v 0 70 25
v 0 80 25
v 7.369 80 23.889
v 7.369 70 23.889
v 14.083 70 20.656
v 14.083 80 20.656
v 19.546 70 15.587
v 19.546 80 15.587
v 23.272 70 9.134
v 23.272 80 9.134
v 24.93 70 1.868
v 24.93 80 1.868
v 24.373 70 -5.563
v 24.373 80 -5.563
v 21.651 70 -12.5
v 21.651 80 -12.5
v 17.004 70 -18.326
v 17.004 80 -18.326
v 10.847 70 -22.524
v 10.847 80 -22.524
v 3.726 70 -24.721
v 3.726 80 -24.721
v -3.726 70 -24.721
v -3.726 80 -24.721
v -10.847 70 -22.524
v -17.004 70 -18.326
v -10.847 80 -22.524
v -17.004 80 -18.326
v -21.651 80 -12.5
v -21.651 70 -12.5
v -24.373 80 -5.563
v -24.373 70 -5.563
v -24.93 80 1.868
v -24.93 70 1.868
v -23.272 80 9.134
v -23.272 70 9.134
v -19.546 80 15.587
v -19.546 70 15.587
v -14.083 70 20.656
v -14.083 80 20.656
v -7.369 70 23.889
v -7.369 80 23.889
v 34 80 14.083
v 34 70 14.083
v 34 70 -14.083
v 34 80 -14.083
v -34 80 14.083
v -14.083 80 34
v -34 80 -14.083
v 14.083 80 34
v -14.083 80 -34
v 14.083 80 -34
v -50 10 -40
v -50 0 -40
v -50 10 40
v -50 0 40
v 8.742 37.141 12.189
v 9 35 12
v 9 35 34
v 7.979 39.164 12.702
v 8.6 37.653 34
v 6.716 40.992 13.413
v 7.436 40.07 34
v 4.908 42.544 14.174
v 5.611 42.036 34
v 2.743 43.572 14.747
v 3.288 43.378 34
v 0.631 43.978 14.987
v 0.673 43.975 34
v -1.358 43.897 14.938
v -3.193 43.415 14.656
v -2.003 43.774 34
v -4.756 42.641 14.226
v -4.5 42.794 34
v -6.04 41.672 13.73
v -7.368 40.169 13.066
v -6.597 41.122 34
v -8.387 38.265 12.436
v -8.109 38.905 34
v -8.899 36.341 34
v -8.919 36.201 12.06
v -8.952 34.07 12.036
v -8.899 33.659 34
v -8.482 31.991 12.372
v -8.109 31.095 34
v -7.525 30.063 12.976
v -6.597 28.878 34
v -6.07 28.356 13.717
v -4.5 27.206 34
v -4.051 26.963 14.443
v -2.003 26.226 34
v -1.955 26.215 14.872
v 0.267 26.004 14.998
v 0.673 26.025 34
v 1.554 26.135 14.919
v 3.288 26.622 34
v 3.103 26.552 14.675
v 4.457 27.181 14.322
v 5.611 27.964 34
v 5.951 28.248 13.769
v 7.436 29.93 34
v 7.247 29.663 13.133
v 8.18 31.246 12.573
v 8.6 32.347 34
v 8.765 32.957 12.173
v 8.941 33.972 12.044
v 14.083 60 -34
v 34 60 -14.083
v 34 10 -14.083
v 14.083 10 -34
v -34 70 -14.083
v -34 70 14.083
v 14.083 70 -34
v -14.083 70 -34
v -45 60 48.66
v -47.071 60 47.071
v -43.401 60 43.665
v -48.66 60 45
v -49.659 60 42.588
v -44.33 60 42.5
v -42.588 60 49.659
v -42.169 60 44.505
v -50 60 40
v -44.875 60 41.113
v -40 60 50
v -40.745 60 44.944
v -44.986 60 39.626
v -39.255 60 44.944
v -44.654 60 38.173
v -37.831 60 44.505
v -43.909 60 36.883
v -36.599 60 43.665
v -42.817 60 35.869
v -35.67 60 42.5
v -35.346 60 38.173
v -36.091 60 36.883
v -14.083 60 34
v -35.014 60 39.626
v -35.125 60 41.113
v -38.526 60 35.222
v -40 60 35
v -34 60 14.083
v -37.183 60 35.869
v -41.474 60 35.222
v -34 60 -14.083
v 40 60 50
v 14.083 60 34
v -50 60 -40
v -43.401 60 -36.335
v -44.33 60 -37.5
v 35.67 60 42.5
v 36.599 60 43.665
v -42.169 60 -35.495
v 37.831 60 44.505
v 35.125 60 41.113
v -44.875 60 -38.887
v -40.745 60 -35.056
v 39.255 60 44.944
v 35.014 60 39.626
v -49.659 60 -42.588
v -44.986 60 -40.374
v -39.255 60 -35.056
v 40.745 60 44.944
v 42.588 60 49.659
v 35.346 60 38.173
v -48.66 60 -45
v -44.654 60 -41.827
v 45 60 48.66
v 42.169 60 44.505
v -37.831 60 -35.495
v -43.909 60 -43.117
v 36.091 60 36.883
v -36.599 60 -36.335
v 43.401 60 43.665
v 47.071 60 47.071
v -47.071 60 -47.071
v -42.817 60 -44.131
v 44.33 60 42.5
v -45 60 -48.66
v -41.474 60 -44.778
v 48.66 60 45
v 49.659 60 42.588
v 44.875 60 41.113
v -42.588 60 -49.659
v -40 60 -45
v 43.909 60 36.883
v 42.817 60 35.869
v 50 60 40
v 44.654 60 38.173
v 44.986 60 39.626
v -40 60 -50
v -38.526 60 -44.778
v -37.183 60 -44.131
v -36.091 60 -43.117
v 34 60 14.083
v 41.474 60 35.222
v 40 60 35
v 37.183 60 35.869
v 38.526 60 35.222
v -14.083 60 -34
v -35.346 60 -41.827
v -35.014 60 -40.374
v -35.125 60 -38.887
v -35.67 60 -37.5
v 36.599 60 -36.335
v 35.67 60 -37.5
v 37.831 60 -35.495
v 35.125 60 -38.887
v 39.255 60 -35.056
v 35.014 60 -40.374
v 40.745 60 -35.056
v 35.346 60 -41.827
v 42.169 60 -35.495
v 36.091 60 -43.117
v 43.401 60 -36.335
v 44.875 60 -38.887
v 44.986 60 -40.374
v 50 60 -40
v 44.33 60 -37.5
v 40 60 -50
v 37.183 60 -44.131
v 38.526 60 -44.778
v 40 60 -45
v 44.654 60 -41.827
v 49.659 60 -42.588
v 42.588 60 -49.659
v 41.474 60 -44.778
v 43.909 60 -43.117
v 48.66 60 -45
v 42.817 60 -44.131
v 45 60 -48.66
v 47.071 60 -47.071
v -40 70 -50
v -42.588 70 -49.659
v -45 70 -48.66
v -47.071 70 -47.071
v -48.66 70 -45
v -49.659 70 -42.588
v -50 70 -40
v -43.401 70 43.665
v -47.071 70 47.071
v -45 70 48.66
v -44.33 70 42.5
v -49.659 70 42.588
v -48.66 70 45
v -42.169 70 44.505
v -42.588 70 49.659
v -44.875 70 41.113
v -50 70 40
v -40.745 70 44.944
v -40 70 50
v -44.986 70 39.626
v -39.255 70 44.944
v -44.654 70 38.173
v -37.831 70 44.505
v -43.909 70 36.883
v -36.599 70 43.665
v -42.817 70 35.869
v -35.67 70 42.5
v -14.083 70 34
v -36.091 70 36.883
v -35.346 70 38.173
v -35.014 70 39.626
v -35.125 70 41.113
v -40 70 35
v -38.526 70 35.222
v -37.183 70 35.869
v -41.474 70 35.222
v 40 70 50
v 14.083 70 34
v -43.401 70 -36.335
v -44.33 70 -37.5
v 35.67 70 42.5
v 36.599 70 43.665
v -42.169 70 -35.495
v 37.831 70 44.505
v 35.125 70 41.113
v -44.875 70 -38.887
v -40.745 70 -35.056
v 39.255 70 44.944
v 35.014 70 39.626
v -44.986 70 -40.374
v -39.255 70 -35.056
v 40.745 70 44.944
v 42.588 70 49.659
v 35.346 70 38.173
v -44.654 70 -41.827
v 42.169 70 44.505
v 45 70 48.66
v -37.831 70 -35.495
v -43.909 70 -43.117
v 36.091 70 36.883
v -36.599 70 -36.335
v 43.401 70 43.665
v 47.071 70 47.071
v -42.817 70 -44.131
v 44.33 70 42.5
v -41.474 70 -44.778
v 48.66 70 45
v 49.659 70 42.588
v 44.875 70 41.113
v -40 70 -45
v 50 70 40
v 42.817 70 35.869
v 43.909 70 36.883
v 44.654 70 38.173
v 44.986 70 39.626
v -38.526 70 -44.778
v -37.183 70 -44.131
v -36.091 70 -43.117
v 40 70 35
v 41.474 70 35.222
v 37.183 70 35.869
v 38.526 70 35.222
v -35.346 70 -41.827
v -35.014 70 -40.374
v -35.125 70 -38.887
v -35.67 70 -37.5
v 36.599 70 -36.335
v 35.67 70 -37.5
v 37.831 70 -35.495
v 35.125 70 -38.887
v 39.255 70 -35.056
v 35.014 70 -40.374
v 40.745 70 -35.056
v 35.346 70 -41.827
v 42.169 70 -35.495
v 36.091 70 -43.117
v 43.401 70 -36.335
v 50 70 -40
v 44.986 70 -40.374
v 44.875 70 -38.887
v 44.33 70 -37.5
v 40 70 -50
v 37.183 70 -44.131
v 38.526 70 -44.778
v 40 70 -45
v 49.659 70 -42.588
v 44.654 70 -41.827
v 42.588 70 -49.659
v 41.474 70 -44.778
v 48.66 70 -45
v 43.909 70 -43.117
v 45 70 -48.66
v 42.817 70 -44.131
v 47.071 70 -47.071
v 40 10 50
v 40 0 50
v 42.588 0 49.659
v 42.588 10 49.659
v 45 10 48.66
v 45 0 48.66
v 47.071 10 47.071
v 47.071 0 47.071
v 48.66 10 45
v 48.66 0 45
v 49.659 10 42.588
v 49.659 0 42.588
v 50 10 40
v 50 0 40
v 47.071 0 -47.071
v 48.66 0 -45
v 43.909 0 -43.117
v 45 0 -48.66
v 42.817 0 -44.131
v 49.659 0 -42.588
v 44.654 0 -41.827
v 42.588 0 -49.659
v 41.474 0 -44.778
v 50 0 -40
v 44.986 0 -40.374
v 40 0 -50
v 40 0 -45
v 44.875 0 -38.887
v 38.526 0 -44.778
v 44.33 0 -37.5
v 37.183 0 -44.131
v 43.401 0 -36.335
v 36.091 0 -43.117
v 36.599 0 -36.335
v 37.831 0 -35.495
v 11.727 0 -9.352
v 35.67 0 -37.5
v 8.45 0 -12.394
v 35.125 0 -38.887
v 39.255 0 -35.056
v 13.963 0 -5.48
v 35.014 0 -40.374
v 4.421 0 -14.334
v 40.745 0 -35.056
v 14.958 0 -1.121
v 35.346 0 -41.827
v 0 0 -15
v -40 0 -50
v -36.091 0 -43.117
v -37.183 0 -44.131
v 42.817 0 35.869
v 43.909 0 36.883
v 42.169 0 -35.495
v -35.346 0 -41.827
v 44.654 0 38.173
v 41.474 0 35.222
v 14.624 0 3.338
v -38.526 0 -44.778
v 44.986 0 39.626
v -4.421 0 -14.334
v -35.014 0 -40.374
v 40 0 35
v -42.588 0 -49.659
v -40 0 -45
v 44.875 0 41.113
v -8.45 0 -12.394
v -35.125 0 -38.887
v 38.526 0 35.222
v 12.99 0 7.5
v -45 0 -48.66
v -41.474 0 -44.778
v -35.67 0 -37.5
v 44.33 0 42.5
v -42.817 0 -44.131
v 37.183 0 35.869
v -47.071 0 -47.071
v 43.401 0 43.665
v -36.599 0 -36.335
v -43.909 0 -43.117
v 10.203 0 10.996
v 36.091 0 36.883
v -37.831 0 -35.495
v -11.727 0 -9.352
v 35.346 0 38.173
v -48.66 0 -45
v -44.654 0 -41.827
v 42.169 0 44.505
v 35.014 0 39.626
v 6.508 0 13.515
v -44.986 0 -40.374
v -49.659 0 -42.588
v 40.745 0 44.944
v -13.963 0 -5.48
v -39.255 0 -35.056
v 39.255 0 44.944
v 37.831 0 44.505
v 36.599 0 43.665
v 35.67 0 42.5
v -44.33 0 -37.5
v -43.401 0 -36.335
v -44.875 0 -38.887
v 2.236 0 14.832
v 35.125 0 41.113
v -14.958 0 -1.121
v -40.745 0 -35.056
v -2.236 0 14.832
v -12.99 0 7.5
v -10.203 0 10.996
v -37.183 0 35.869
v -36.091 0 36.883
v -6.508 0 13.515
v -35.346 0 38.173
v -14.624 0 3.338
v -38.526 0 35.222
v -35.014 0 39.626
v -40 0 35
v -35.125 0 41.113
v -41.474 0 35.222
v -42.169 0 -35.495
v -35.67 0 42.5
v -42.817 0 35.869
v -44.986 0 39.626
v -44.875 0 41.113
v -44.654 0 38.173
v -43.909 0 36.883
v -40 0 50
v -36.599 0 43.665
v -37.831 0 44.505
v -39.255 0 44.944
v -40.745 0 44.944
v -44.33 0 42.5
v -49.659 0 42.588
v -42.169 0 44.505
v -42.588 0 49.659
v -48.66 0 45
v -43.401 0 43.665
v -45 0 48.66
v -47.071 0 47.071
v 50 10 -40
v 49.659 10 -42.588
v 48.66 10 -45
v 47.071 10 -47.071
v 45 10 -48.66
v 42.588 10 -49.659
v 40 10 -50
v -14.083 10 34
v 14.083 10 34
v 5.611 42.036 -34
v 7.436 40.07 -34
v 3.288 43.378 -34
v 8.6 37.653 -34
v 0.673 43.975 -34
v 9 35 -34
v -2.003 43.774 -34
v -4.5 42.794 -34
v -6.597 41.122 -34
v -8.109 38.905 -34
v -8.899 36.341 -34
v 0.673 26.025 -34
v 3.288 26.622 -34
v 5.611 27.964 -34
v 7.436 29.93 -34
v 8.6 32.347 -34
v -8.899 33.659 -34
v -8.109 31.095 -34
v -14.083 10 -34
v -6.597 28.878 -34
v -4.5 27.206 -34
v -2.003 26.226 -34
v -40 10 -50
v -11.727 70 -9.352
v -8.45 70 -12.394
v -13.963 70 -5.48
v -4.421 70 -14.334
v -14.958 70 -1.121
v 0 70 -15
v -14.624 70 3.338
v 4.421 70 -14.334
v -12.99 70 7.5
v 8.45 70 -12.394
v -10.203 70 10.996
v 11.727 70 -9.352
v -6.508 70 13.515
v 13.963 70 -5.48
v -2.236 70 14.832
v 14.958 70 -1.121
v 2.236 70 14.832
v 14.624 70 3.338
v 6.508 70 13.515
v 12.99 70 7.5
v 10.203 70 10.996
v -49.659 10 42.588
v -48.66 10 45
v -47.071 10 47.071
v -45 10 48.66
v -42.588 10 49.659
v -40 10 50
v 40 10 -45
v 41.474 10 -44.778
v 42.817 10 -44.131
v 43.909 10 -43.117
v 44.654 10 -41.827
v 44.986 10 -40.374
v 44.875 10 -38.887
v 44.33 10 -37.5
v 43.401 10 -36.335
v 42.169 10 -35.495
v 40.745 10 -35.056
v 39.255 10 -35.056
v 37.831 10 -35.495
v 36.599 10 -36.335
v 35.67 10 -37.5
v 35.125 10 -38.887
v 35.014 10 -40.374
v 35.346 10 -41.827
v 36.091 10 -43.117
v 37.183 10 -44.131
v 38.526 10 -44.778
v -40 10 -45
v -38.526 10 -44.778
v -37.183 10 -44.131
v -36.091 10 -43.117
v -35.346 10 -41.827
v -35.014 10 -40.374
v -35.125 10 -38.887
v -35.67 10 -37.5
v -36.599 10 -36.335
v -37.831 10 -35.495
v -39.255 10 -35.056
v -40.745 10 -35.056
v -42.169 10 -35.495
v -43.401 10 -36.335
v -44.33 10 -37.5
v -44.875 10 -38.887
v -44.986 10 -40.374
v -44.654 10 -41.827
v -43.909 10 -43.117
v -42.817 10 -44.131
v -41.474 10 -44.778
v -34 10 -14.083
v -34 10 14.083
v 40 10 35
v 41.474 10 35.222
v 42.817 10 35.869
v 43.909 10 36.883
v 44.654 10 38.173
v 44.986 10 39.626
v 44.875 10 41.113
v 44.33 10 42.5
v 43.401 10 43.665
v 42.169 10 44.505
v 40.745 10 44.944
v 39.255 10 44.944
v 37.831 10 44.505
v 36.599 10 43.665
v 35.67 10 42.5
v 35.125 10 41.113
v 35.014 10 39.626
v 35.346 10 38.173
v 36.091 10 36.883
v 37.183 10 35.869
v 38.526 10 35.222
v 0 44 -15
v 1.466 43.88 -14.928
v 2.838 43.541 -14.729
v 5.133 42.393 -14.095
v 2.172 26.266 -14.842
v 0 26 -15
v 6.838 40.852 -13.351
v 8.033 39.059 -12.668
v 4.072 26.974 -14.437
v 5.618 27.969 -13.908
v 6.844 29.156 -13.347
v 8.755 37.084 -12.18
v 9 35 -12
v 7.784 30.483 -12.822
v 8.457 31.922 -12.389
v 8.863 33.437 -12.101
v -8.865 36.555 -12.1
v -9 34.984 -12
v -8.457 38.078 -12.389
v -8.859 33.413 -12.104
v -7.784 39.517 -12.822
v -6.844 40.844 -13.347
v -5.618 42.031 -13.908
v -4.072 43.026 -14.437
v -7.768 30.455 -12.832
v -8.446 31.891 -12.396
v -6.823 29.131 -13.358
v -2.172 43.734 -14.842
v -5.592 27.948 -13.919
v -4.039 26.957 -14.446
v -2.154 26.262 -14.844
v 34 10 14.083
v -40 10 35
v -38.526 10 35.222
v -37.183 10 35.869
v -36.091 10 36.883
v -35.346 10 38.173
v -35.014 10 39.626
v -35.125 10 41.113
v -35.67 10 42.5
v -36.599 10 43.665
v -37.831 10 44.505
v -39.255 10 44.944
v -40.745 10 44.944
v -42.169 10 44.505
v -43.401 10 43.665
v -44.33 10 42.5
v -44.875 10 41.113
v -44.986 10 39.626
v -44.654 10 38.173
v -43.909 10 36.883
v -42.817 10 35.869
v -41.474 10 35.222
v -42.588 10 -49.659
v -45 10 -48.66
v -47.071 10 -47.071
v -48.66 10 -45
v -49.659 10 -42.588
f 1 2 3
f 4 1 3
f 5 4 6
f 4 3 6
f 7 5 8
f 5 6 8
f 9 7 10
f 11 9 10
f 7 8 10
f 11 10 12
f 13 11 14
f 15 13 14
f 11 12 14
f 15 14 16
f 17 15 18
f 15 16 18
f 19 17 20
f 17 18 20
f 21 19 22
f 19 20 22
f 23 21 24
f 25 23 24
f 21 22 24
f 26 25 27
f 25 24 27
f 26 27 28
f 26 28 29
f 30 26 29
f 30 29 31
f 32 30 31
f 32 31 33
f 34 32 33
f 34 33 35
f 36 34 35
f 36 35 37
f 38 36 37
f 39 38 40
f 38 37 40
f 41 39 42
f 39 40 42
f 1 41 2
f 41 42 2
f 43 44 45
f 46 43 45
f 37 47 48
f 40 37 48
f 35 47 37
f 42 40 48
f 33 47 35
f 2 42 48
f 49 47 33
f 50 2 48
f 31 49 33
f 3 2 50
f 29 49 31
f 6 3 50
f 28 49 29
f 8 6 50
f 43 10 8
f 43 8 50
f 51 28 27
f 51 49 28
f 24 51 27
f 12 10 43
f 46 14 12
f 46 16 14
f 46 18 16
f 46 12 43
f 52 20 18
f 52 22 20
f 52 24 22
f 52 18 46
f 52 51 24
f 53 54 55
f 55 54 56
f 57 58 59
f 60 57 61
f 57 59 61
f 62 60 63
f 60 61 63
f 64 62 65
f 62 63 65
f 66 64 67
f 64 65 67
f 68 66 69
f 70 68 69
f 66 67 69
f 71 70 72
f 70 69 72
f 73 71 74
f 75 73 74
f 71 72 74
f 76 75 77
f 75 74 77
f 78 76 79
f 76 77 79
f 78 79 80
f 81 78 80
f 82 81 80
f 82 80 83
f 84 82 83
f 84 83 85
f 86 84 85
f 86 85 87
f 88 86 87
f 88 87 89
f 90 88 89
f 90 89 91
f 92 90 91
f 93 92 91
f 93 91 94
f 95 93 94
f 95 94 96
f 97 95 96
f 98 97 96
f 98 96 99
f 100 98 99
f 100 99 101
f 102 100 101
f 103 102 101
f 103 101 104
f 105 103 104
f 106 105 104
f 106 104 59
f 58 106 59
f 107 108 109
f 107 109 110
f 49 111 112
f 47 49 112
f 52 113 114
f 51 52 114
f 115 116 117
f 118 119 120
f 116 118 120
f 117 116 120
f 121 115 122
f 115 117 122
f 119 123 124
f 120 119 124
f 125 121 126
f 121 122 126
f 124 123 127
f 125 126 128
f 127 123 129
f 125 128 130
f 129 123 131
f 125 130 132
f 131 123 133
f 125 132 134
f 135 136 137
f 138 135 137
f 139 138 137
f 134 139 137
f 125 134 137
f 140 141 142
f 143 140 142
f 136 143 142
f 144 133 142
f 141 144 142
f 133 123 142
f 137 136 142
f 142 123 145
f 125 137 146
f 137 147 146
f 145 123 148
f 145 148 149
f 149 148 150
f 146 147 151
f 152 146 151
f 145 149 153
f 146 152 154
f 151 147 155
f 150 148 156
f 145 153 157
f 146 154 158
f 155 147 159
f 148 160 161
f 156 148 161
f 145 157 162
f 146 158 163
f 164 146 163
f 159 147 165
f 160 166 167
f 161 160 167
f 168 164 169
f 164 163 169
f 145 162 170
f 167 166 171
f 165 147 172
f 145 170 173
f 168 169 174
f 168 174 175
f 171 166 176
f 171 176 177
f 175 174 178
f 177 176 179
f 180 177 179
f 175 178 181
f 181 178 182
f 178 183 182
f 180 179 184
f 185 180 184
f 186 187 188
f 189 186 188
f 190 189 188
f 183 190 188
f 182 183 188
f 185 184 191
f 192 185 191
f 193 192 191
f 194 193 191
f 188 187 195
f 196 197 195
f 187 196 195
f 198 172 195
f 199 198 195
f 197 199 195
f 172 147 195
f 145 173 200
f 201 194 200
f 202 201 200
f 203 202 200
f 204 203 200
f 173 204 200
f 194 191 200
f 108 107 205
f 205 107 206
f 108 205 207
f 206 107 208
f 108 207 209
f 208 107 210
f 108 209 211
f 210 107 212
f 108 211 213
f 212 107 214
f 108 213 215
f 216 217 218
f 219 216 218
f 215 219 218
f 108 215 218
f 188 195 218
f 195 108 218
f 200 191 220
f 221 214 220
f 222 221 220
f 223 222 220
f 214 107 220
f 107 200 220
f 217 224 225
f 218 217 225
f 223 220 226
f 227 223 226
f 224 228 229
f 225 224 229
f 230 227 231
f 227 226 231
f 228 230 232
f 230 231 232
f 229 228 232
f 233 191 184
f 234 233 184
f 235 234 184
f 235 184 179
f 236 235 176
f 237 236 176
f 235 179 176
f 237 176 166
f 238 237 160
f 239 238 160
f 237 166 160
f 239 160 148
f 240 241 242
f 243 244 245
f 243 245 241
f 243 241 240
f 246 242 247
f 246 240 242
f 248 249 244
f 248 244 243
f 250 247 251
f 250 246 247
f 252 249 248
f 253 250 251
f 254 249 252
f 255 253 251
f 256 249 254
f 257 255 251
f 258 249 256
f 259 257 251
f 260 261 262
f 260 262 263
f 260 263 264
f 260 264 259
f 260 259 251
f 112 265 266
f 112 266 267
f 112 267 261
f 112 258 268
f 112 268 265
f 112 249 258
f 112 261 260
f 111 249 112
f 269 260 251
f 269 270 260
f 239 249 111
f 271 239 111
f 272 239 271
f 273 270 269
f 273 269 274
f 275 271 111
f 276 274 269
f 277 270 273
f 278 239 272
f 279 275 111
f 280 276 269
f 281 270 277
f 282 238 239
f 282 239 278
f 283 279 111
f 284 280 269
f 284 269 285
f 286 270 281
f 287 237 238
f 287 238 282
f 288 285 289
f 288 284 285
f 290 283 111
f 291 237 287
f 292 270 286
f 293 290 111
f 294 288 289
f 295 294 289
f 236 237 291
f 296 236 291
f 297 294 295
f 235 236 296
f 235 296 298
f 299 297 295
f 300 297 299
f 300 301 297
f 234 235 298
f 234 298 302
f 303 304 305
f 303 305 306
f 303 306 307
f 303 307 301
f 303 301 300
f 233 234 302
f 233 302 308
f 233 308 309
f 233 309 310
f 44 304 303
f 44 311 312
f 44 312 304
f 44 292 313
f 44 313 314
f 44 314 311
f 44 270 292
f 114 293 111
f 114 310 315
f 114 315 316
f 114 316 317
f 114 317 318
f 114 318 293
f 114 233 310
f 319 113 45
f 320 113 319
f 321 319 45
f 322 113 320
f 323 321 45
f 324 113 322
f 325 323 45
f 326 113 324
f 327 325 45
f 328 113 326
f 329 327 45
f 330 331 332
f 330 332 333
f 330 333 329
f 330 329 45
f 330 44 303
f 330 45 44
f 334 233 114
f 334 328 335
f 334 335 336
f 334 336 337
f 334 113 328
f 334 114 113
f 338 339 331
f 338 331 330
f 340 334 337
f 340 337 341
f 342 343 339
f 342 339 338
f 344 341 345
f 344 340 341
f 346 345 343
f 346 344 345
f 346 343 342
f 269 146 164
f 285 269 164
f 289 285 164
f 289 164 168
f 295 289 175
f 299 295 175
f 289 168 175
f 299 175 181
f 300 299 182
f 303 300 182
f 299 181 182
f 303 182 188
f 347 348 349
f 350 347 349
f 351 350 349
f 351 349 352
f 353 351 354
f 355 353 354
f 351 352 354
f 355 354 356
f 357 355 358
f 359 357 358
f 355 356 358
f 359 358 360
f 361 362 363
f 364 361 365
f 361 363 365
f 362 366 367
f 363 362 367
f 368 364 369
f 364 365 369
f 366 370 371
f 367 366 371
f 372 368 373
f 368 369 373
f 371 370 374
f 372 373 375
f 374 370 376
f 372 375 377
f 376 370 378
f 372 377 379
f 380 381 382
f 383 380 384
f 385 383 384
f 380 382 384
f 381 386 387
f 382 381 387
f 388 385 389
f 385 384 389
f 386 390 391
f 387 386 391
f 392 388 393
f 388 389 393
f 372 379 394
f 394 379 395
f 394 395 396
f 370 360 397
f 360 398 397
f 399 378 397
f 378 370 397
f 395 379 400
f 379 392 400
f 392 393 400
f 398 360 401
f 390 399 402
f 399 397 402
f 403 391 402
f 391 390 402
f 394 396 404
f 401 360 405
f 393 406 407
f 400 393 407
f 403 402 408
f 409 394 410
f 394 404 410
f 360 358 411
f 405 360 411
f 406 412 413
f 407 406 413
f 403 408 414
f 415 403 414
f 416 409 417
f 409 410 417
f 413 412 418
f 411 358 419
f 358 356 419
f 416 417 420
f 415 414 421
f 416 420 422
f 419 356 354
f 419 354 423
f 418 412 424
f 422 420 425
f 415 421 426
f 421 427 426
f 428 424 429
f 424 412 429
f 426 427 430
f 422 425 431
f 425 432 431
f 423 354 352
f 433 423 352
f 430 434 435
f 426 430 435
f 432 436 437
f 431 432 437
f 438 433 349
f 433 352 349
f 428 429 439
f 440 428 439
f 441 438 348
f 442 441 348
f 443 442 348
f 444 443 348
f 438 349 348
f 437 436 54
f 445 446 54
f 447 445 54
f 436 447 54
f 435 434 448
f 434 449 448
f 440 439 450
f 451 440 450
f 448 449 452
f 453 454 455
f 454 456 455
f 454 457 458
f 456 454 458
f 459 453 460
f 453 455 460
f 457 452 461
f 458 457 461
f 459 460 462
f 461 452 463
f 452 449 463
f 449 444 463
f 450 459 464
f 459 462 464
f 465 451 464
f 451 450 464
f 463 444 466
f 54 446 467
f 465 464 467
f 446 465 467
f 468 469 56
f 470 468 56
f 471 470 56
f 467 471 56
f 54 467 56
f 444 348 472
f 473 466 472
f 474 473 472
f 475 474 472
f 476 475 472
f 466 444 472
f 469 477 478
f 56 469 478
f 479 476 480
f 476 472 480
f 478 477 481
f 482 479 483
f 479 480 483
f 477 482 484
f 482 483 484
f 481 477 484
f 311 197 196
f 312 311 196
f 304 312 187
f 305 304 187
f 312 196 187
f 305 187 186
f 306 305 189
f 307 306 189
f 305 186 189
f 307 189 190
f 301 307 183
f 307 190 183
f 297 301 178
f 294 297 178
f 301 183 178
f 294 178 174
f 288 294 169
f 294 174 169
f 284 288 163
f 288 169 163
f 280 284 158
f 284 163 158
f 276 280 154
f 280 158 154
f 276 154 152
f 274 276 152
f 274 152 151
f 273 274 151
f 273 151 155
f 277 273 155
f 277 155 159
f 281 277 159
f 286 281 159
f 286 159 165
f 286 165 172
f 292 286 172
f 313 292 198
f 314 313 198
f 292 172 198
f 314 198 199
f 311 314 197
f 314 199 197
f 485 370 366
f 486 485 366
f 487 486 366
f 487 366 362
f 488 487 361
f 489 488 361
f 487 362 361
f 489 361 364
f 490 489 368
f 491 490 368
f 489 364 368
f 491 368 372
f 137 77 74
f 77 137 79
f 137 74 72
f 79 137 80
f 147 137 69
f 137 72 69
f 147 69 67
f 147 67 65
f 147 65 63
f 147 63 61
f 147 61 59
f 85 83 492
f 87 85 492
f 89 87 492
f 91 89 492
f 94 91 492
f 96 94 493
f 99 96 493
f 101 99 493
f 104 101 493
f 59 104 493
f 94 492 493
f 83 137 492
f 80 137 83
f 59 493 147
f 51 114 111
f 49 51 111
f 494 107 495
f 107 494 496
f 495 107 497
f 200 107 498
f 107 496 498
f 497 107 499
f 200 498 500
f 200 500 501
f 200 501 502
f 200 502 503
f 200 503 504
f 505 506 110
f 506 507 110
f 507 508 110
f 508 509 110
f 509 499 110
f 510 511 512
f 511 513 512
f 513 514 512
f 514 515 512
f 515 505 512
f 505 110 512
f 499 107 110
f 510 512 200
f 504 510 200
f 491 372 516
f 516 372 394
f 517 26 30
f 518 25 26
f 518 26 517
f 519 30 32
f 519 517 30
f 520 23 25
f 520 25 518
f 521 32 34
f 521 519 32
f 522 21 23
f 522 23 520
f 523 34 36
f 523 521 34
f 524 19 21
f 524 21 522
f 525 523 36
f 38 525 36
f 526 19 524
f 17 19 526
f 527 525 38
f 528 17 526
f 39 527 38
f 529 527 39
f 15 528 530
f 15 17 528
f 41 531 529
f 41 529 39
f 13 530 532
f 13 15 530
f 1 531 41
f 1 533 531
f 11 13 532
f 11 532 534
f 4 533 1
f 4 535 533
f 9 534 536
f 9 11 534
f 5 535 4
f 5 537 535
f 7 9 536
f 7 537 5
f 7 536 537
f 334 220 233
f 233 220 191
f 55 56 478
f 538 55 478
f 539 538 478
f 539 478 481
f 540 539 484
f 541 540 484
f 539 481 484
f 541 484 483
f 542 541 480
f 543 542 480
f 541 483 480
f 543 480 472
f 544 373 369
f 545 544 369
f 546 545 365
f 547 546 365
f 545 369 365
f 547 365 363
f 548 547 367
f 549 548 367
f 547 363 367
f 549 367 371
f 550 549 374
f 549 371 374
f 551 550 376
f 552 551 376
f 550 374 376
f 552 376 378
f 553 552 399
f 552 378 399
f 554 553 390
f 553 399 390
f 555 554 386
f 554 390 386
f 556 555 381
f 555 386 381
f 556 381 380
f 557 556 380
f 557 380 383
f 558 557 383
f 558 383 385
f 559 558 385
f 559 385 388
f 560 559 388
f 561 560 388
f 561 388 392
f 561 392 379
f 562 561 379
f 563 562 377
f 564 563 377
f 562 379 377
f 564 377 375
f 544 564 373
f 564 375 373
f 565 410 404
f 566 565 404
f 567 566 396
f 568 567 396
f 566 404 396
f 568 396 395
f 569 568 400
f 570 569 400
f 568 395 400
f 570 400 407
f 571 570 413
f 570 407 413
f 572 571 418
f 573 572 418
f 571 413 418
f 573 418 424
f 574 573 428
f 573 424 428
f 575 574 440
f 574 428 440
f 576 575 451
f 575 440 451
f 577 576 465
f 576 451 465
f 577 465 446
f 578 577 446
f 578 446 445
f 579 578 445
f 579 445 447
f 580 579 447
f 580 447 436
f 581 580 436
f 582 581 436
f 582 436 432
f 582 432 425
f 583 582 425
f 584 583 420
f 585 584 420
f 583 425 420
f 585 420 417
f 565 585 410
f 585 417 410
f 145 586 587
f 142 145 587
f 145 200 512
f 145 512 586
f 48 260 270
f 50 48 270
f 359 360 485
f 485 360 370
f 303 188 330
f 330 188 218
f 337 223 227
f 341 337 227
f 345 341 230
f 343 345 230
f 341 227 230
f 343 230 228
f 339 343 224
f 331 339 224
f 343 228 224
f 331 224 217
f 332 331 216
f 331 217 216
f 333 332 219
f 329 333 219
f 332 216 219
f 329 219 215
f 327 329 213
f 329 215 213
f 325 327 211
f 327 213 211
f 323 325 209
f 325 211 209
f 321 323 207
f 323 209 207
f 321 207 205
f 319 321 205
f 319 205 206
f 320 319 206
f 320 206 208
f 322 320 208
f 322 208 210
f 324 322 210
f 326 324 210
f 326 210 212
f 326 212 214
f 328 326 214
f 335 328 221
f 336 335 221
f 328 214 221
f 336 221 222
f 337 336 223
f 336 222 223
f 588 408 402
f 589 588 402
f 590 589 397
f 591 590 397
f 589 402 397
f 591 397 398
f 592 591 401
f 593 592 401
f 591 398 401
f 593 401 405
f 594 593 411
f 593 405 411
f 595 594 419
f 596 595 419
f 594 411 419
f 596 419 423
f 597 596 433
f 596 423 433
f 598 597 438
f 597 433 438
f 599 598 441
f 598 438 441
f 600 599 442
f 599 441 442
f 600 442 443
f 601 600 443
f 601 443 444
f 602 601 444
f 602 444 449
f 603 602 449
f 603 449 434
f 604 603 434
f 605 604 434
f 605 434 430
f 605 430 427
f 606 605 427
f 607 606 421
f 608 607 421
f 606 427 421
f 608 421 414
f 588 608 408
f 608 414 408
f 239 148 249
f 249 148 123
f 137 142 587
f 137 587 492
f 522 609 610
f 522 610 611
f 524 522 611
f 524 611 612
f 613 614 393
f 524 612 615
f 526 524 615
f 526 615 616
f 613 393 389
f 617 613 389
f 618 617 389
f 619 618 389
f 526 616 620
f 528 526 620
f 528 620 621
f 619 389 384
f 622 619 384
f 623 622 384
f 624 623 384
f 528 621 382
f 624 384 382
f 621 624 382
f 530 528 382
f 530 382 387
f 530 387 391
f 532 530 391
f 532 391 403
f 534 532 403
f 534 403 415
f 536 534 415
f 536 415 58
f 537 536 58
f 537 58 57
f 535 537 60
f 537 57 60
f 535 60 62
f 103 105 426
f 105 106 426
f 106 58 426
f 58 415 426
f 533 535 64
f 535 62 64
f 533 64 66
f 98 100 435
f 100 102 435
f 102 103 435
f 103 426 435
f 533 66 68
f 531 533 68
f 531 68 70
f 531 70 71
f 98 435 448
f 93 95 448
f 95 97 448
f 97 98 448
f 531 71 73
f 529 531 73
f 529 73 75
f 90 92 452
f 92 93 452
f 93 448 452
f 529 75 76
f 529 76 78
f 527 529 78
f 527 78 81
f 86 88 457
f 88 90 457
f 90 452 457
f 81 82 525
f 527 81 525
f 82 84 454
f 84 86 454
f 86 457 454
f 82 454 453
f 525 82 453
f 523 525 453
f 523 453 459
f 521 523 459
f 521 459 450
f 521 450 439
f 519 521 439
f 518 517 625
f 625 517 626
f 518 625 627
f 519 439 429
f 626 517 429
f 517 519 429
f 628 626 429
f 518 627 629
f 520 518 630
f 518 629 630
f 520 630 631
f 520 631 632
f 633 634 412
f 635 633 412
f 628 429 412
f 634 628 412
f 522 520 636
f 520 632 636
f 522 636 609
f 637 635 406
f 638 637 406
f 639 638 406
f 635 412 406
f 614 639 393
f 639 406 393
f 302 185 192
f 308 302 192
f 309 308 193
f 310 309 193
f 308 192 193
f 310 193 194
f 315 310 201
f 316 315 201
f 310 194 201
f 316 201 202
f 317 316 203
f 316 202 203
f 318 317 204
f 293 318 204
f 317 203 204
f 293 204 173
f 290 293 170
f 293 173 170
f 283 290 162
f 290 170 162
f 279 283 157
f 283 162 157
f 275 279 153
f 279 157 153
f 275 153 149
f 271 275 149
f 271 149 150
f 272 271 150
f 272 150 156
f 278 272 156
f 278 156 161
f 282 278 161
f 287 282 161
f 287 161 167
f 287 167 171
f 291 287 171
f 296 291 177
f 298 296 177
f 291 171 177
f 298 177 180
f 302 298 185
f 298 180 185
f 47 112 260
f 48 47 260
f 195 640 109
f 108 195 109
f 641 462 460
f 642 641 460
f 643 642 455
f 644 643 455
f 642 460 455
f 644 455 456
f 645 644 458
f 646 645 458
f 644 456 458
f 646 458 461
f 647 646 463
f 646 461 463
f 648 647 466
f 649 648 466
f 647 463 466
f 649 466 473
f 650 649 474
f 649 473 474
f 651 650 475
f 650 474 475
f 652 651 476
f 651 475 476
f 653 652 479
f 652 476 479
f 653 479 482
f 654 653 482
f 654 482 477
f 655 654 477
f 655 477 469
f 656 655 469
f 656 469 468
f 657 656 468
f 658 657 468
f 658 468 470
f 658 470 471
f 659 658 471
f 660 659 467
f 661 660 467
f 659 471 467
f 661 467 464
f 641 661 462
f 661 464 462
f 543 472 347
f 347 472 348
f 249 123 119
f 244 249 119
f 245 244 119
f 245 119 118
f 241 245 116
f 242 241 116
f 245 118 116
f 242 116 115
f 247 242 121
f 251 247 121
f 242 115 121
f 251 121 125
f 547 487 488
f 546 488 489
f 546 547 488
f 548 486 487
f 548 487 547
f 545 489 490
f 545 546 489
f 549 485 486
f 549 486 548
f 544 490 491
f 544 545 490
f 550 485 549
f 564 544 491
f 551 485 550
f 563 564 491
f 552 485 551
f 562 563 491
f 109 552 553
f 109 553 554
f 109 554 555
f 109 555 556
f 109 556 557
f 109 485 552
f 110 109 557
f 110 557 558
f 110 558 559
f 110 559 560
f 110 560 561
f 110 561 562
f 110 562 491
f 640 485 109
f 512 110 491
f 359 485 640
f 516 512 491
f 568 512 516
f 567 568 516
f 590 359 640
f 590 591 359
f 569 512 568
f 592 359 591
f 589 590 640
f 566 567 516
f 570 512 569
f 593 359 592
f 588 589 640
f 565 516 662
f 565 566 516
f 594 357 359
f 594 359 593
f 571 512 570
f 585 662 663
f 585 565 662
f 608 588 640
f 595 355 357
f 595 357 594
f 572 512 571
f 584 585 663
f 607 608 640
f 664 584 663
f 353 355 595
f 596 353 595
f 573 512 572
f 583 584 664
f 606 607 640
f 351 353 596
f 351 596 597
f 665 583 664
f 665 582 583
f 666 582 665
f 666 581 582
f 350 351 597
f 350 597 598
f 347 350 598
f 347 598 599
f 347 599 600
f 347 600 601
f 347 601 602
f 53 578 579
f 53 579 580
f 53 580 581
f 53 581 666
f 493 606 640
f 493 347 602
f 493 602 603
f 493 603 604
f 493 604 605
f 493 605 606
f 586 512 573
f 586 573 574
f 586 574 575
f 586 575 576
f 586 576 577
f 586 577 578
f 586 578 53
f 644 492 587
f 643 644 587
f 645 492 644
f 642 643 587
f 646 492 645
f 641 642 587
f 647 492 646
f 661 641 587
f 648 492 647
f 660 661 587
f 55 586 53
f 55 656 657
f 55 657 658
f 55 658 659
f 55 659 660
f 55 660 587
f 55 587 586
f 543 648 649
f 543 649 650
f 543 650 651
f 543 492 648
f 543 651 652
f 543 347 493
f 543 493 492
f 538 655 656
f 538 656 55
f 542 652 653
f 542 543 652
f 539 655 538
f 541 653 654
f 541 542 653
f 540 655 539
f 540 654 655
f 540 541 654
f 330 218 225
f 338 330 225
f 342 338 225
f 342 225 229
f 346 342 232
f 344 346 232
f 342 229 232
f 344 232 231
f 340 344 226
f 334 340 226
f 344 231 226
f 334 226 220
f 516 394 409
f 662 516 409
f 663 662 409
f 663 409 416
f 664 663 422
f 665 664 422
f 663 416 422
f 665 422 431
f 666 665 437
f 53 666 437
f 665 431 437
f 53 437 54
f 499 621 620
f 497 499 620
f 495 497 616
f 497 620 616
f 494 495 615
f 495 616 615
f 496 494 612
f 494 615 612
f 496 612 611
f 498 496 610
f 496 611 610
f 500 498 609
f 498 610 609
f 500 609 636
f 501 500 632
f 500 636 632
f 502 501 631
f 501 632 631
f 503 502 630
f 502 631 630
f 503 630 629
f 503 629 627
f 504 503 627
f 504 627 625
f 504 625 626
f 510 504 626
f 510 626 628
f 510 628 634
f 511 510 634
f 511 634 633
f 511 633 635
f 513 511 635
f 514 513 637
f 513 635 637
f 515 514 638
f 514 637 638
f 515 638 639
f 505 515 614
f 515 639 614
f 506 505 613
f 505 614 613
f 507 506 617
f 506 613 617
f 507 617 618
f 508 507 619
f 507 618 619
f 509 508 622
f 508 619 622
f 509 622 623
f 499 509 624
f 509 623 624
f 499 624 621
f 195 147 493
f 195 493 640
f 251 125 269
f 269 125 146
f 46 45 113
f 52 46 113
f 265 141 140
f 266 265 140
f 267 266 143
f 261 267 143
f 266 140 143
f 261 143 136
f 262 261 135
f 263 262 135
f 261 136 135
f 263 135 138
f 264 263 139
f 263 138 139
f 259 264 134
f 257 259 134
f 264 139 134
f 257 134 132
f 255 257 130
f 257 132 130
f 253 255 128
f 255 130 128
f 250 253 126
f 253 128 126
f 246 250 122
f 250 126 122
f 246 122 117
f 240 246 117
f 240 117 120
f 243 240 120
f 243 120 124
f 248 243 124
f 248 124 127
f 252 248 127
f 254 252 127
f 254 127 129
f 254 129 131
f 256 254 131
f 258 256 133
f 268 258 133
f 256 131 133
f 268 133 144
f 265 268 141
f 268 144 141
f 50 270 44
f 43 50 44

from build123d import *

# Parameters (mm, degrees)
BOSS_EXTRUDE1_DEPTH = 80
SKETCH2_R           = 25
CUT_EXTRUDE1_DEPTH  = 10
SKETCH3_R           = 15
CUT_EXTRUDE2_DEPTH  = 70
SKETCH4_R           = 5
BOSS_EXTRUDE2_DEPTH = 10
SKETCH5_R           = 5
BOSS_EXTRUDE3_DEPTH = 10
SKETCH6_R           = 15
CUT_EXTRUDE3_DEPTH  = 80
SKETCH7_R           = 9
CUT_EXTRUDE4_DEPTH  = 80


with BuildPart() as part:
    # Sketch1 → Boss-Extrude1 (new body)
    with BuildSketch(Plane(origin=(0, 0, 0), x_dir=(1, 0, 0), z_dir=(0, 1, 0))):
        Polygon((34, 14.083261121), (14.083261121, 34), (-14.083261121, 34), (-34, 14.083261121), (-34, -14.083261121), (-14.083261121, -34), (14.083261121, -34), (34, -14.083261121), align=None)
    extrude(amount=BOSS_EXTRUDE1_DEPTH)

    # Sketch2 → Cut-Extrude1 (cut)
    with BuildSketch(Plane(origin=(0, 80, 0), x_dir=(1, 0, 0), z_dir=(0, 1, 0))):
        with Locations(Location((0, 0, 0), (0, 0, 270))):
            Circle(SKETCH2_R)
    extrude(amount=-CUT_EXTRUDE1_DEPTH, mode=Mode.SUBTRACT)

    # Sketch3 → Cut-Extrude2 (cut)
    with BuildSketch(Plane.XZ):
        with Locations(Location((0, 0, 0), (0, 0, 270))):
            Circle(SKETCH3_R)
    extrude(amount=-CUT_EXTRUDE2_DEPTH, mode=Mode.SUBTRACT)

    # Sketch4 → Boss-Extrude2 (add)
    with BuildSketch(Plane.XZ):
        with BuildLine():
            Line((-40, 50), (40, 50))
            ThreePointArc((40, 50), (47.071067812, 47.071067812), (50, 40))
            Line((50, 40), (50, -40))
            ThreePointArc((50, -40), (47.071067812, -47.071067812), (40, -50))
            Line((40, -50), (-40, -50))
            ThreePointArc((-40, -50), (-47.071067812, -47.071067812), (-50, -40))
            Line((-50, -40), (-50, 40))
            ThreePointArc((-50, 40), (-47.071067812, 47.071067812), (-40, 50))
        make_face()
        with Locations(Location((-40, 40, 0), (0, 0, 270))):
            Circle(SKETCH4_R, mode=Mode.SUBTRACT)
        with Locations(Location((40, 40, 0), (0, 0, 270))):
            Circle(SKETCH4_R, mode=Mode.SUBTRACT)
        with Locations(Location((-40, -40, 0), (0, 0, 270))):
            Circle(SKETCH4_R, mode=Mode.SUBTRACT)
        with Locations(Location((40, -40, 0), (0, 0, 270))):
            Circle(SKETCH4_R, mode=Mode.SUBTRACT)
    extrude(amount=-BOSS_EXTRUDE2_DEPTH)

    # Sketch5 → Boss-Extrude3 (add)
    with BuildSketch(Plane(origin=(0, 60, 0), x_dir=(-1, 0, 0), z_dir=(0, -1, 0))):
        with BuildLine():
            Line((-40, 50), (40, 50))
            ThreePointArc((40, 50), (47.071067812, 47.071067812), (50, 40))
            Line((50, 40), (50, -40))
            ThreePointArc((50, -40), (47.071067812, -47.071067812), (40, -50))
            Line((40, -50), (-40, -50))
            ThreePointArc((-40, -50), (-47.071067812, -47.071067812), (-50, -40))
            Line((-50, -40), (-50, 40))
            ThreePointArc((-50, 40), (-47.071067812, 47.071067812), (-40, 50))
        make_face()
        with Locations(Location((-40, 40, 0), (0, 0, 90))):
            Circle(SKETCH5_R, mode=Mode.SUBTRACT)
        with Locations(Location((40, 40, 0), (0, 0, 90))):
            Circle(SKETCH5_R, mode=Mode.SUBTRACT)
        with Locations(Location((-40, -40, 0), (0, 0, 90))):
            Circle(SKETCH5_R, mode=Mode.SUBTRACT)
        with Locations(Location((40, -40, 0), (0, 0, 90))):
            Circle(SKETCH5_R, mode=Mode.SUBTRACT)
    extrude(amount=-BOSS_EXTRUDE3_DEPTH)

    # Sketch6 → Cut-Extrude3 (cut)
    with BuildSketch(Plane.XZ):
        with Locations(Location((0, 0, 0), (0, 0, 270))):
            Circle(SKETCH6_R)
    extrude(amount=-CUT_EXTRUDE3_DEPTH, mode=Mode.SUBTRACT)

    # Sketch7 → Cut-Extrude4 (cut)
    with BuildSketch(Plane.XY.offset(34)):
        with Locations((0, 35)):
            Circle(SKETCH7_R)
    extrude(amount=-CUT_EXTRUDE4_DEPTH, mode=Mode.SUBTRACT)


solid = part.part
